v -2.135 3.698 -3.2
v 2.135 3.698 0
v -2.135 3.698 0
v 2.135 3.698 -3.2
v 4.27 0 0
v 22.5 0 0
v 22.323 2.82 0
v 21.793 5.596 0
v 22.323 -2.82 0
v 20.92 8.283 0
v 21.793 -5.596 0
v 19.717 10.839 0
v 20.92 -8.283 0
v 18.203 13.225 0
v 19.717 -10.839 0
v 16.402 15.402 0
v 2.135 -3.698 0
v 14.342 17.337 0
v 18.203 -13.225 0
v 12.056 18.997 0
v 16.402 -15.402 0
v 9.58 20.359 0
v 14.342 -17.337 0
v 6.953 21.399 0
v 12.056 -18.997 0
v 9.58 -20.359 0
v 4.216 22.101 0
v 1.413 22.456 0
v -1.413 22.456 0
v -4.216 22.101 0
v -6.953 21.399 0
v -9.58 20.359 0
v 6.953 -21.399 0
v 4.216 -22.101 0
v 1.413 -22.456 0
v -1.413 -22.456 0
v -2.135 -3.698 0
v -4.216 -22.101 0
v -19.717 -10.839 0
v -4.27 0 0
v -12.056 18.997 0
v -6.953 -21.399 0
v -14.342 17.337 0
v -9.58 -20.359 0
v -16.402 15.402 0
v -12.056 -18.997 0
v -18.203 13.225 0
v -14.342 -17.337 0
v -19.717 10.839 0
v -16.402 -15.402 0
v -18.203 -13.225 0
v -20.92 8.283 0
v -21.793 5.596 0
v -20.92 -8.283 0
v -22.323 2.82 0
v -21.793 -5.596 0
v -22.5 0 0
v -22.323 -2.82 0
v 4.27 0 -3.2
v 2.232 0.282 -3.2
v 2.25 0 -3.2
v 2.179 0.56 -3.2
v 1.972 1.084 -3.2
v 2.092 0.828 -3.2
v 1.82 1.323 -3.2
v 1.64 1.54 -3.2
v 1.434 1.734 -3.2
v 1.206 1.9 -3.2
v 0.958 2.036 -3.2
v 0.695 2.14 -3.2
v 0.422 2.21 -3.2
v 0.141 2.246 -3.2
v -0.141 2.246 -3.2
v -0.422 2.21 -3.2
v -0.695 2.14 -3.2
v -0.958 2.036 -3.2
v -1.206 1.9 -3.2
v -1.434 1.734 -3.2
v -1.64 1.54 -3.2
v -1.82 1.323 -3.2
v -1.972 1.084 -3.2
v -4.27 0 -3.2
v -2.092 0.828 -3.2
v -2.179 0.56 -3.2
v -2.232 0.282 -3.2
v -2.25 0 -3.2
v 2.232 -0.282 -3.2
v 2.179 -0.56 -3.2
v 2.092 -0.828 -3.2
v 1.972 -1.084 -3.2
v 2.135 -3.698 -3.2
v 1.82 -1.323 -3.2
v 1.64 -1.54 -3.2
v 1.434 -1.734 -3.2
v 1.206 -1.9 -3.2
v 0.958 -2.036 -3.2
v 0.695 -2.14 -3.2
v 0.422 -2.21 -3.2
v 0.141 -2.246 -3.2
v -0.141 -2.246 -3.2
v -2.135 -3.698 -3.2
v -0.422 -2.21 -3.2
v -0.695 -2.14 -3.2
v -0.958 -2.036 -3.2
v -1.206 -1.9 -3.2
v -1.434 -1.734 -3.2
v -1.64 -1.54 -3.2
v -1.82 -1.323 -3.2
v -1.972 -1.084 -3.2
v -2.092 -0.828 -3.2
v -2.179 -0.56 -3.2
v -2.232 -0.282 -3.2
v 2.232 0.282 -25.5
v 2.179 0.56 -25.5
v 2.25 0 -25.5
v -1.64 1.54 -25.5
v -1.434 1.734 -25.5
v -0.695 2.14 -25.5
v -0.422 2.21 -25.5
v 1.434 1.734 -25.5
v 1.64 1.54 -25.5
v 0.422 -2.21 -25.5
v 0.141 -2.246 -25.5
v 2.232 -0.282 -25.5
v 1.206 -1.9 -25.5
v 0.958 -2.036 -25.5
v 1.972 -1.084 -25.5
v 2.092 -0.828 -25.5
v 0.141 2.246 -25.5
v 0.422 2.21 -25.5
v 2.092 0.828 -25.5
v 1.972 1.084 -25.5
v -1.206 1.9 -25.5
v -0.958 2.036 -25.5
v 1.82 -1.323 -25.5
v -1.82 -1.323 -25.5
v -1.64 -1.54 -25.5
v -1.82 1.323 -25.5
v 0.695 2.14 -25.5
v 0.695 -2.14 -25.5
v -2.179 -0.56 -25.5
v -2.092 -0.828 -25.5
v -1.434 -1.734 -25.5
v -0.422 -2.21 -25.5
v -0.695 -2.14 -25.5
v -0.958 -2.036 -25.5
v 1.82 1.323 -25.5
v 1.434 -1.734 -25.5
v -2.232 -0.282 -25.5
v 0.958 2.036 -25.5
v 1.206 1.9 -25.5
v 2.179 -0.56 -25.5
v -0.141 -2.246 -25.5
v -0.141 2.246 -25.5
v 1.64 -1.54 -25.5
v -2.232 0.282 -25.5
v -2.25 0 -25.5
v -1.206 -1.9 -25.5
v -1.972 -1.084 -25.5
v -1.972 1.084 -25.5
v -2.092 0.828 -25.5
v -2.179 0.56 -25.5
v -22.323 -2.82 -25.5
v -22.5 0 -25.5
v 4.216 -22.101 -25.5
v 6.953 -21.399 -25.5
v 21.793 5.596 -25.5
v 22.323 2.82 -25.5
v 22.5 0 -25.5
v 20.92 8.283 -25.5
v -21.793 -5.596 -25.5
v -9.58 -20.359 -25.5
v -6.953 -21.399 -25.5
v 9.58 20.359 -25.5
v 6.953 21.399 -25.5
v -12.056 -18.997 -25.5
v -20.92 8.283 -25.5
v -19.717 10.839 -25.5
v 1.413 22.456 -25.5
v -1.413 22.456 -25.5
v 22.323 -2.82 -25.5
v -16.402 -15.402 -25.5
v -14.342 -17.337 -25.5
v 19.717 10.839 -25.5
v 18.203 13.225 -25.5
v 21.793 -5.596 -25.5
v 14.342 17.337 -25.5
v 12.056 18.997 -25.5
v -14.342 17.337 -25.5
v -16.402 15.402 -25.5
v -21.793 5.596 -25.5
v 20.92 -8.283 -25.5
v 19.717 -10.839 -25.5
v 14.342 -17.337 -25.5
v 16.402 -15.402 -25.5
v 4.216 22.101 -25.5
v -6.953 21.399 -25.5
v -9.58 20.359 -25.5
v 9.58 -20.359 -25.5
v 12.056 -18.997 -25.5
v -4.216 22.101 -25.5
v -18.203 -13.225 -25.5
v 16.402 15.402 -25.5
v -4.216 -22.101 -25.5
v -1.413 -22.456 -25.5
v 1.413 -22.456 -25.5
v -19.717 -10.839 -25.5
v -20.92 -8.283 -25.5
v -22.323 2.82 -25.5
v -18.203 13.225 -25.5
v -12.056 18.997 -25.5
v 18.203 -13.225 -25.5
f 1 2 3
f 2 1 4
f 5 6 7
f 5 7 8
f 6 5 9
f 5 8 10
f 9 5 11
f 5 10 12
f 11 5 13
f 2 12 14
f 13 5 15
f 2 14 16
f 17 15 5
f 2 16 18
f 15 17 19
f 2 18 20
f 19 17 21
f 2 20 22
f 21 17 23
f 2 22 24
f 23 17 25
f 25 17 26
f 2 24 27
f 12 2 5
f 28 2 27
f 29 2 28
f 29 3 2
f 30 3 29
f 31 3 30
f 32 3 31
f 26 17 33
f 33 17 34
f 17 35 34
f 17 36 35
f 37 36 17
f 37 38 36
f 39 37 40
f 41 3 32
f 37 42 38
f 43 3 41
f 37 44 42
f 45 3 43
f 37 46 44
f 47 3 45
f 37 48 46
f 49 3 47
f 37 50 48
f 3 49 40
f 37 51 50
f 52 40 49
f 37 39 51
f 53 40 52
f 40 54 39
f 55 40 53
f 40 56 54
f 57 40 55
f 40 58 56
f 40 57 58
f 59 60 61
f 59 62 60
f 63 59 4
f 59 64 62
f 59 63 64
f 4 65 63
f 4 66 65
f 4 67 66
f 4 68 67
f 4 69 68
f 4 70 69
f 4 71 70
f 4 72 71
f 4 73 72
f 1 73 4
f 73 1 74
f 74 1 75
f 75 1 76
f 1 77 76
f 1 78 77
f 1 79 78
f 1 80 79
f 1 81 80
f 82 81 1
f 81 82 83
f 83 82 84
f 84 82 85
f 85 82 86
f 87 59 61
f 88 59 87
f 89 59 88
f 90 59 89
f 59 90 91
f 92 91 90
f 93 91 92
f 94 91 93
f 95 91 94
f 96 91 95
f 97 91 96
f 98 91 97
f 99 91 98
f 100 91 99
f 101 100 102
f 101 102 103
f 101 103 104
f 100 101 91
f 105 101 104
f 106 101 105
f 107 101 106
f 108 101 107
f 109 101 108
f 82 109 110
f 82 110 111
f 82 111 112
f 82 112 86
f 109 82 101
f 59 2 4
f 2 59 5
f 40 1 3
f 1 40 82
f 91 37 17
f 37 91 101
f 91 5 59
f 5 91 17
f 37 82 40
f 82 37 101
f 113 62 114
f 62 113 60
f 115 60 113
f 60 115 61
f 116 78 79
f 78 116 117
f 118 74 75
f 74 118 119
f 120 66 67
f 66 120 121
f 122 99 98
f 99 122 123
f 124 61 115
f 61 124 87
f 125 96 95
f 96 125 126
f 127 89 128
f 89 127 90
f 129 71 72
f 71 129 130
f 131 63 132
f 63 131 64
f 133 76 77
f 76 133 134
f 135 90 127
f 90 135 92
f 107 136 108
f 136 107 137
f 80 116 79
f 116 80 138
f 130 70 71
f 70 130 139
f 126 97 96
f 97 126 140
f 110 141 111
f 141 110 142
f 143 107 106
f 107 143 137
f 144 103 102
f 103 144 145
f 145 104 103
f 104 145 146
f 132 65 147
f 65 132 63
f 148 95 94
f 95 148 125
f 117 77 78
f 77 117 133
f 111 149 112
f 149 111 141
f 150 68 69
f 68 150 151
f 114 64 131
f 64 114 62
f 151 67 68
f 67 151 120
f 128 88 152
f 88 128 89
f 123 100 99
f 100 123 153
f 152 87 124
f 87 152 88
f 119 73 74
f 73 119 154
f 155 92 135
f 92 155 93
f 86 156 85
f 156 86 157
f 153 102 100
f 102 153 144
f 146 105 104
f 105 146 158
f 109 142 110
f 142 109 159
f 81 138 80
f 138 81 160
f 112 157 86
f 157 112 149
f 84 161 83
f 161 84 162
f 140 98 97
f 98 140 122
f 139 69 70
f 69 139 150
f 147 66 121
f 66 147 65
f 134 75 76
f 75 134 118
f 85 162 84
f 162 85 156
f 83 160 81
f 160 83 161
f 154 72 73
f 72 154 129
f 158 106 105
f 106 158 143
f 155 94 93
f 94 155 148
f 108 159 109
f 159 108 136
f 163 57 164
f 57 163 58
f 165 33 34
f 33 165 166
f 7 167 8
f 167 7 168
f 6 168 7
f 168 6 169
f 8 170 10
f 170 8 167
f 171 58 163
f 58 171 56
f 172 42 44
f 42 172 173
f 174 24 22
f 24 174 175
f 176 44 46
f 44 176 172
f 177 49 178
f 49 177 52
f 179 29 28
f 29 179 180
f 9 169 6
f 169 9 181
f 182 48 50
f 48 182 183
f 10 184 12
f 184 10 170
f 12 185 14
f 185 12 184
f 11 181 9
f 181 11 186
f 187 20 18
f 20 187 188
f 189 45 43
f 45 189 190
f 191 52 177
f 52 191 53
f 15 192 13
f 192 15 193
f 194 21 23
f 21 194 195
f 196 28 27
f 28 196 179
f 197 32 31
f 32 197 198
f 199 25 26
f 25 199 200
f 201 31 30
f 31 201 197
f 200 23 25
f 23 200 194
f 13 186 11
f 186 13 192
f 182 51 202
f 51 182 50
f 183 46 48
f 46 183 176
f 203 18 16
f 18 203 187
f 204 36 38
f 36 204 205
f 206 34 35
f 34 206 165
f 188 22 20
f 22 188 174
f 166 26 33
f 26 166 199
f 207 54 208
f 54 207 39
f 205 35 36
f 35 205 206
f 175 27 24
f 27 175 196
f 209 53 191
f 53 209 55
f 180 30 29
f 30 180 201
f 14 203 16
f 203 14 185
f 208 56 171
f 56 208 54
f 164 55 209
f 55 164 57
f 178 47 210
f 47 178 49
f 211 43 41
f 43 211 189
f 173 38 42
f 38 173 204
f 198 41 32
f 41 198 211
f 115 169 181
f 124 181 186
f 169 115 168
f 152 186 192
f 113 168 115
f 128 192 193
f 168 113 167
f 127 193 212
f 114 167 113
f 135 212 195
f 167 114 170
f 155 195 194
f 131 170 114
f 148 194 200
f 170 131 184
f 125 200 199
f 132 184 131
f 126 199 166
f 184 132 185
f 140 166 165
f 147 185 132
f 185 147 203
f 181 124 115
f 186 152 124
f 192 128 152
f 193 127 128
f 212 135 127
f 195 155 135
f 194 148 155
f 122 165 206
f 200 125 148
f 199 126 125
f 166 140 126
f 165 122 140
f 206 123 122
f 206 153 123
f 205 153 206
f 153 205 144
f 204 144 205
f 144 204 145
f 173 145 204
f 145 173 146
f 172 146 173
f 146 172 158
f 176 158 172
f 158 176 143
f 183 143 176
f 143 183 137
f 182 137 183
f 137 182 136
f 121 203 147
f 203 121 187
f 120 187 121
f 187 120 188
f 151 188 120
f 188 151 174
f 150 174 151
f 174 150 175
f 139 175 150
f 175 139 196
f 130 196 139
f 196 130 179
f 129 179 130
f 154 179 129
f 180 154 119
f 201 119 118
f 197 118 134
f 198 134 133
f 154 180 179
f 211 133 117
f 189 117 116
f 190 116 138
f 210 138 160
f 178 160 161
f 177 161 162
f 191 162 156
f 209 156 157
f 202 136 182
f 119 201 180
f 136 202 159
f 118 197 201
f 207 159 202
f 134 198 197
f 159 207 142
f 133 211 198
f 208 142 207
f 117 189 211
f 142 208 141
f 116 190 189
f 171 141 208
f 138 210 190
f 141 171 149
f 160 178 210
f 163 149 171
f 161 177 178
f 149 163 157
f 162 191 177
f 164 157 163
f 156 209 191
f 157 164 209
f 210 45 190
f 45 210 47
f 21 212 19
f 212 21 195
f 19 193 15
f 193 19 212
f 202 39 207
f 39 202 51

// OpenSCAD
$fn = 50;


difference() {
	union() {
		translate(v = [0, 0, -25.5000000000]) {
			cylinder(h = 25.5000000000, r = 22.5000000000);
		}
	}
	union() {
		translate(v = [0, 0, 0]) {
			rotate(a = [0, 0, 0]) {
				difference() {
					union() {
						translate(v = [0, 0, -3.2000000000]) {
							linear_extrude(height = 3.2000000000) {
								polygon(points = [[4.2698000000, 0.0000000000], [2.1349000000, 3.6977552691], [-2.1349000000, 3.6977552691], [-4.2698000000, 0.0000000000], [-2.1349000000, -3.6977552691], [2.1349000000, -3.6977552691]]);
							}
						}
					}
					union();
				}
			}
		}
		#translate(v = [0, 0, -100.0000000000]) {
			cylinder(h = 200, r = 2.2500000000);
		}
	}
}
